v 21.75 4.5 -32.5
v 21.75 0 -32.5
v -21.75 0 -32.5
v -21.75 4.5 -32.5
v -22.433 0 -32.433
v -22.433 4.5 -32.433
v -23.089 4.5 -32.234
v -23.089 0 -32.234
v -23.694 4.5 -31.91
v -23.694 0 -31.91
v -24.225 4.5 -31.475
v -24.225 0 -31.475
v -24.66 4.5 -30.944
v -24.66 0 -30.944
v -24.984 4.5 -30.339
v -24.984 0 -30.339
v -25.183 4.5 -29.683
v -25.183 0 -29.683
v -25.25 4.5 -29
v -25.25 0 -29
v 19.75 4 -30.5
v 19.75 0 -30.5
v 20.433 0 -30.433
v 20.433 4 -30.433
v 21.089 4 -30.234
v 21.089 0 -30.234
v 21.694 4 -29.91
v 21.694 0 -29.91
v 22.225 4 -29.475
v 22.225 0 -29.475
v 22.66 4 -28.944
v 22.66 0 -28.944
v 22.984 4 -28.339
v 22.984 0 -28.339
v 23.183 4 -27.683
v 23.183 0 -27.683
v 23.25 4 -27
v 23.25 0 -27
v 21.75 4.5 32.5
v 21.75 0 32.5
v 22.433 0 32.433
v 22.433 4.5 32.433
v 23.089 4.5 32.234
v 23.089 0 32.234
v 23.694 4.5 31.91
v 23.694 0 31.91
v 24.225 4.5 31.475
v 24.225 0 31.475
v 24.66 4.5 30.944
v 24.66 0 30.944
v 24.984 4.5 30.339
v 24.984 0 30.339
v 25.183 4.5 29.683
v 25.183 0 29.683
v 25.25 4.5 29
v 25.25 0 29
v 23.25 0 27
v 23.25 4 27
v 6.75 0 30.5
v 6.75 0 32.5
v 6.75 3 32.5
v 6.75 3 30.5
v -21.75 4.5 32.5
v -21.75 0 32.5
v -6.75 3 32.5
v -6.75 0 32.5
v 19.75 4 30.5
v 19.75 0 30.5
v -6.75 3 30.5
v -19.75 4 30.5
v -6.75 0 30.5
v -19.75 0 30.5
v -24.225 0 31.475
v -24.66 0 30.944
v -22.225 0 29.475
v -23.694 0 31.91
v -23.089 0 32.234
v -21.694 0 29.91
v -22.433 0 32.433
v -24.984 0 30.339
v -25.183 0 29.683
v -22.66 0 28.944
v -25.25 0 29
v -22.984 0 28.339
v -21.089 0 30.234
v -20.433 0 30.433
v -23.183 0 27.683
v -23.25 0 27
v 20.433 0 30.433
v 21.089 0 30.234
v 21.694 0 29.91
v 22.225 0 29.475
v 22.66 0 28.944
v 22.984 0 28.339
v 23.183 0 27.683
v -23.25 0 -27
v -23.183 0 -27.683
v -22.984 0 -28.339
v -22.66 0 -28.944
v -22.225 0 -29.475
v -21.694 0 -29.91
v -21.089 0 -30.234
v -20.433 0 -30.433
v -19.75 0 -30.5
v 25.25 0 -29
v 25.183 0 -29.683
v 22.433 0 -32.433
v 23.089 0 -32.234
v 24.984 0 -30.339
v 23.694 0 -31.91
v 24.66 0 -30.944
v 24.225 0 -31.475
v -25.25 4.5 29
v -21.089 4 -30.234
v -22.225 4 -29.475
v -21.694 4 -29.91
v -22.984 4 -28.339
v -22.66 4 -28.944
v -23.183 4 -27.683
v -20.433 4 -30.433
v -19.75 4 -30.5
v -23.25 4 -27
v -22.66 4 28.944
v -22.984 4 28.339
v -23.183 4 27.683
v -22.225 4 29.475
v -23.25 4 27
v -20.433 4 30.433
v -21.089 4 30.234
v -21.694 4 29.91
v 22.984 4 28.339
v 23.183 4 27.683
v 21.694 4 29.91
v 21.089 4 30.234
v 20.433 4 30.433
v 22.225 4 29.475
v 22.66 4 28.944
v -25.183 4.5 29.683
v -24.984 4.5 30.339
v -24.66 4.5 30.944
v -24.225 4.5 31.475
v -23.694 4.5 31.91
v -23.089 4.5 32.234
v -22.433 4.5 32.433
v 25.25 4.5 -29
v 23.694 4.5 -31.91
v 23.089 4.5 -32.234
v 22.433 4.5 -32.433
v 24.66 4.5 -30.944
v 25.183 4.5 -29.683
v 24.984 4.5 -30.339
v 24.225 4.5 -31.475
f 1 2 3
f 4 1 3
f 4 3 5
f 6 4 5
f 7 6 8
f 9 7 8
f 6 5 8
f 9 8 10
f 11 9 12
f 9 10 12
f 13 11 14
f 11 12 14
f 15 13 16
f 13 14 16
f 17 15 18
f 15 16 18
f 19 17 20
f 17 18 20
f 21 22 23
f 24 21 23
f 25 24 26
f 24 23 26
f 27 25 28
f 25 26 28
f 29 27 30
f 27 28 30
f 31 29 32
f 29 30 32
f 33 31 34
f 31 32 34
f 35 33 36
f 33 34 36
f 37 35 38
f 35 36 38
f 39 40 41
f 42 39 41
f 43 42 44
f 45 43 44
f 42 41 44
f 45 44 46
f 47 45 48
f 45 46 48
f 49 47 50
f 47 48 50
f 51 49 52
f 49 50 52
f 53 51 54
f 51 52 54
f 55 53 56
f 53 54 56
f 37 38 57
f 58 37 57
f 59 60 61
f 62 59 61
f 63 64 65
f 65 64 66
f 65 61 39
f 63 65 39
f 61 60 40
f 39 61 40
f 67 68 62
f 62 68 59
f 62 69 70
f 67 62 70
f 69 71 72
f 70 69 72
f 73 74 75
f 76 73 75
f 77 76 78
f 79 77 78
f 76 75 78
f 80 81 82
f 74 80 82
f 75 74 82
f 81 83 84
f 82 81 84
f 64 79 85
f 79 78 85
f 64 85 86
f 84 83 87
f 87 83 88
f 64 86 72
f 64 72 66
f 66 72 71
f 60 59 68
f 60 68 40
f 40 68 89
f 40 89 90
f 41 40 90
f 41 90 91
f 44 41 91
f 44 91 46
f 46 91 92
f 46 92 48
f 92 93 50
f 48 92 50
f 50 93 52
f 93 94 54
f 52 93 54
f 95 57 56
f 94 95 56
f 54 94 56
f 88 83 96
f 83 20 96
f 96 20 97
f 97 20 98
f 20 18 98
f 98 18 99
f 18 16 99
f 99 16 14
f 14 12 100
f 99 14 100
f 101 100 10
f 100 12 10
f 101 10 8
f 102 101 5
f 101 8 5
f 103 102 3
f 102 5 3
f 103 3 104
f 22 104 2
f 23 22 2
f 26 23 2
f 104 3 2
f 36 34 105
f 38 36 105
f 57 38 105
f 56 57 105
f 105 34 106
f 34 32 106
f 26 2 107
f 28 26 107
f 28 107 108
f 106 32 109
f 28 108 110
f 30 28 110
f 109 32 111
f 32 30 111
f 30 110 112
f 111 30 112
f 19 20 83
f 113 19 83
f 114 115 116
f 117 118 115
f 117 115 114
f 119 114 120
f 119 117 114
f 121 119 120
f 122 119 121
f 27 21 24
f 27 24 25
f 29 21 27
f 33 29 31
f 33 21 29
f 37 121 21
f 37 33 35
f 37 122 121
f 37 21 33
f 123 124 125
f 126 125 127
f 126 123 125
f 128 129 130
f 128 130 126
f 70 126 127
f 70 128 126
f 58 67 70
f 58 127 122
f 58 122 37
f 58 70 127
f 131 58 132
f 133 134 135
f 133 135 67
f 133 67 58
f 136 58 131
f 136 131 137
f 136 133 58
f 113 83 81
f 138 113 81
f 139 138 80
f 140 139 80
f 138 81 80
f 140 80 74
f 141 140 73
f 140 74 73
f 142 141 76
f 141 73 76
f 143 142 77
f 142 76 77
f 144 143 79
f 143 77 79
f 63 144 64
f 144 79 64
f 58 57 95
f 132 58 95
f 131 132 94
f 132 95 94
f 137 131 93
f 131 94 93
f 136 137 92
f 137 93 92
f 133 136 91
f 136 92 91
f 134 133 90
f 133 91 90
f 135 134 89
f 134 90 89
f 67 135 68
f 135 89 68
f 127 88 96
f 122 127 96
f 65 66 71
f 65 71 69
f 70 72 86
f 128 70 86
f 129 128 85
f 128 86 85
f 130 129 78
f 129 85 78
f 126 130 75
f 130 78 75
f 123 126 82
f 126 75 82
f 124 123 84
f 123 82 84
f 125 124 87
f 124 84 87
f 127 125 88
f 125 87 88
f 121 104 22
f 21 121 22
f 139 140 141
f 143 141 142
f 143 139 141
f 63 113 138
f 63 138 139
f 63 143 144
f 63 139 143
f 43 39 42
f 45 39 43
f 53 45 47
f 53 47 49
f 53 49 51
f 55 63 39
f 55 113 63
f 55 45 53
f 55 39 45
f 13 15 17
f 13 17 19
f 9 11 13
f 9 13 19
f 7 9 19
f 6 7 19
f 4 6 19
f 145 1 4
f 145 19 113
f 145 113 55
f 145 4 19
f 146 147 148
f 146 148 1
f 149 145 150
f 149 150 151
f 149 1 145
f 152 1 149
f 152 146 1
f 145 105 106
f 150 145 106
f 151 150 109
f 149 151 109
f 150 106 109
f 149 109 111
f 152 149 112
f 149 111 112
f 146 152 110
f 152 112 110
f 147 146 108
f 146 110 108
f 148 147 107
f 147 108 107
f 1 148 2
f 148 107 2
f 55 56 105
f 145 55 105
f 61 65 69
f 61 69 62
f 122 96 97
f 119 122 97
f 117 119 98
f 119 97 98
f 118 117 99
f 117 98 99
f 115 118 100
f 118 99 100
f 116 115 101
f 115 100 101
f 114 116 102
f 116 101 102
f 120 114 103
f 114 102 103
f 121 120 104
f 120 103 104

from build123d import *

# Parameters (mm, degrees)
BOSS_EXTRUDE1_DEPTH = 4.5
CUT_EXTRUDE1_DEPTH  = 4
SKETCH3_W           = 13.5
SKETCH3_H           = 6
CUT_EXTRUDE2_DEPTH  = 15


with BuildPart() as part:
    # Sketch1 → Boss-Extrude1 (new body)
    with BuildSketch(Plane(origin=(0, 0, 0), x_dir=(1, 0, 0), z_dir=(0, 1, 0))):
        with BuildLine():
            Line((-21.75, -32.5), (21.75, -32.5))
            ThreePointArc((21.75, -32.5), (24.224873734, -31.474873734), (25.25, -29))
            Line((25.25, -29), (25.25, 29))
            ThreePointArc((25.25, 29), (24.224873734, 31.474873734), (21.75, 32.5))
            Line((21.75, 32.5), (-21.75, 32.5))
            ThreePointArc((-21.75, 32.5), (-24.224873734, 31.474873734), (-25.25, 29))
            Line((-25.25, 29), (-25.25, -29))
            ThreePointArc((-25.25, -29), (-24.224873734, -31.474873734), (-21.75, -32.5))
        make_face()
    extrude(amount=BOSS_EXTRUDE1_DEPTH)

    # Sketch2 → Cut-Extrude1 (cut)
    with BuildSketch(Plane.XZ):
        with BuildLine():
            Line((-19.75, -30.5), (19.75, -30.5))
            ThreePointArc((19.75, -30.5), (22.224873734, -29.474873734), (23.25, -27))
            Line((23.25, -27), (23.25, 27))
            ThreePointArc((23.25, 27), (22.224873734, 29.474873734), (19.75, 30.5))
            Line((19.75, 30.5), (-19.75, 30.5))
            ThreePointArc((-19.75, 30.5), (-22.224873734, 29.474873734), (-23.25, 27))
            Line((-23.25, 27), (-23.25, -27))
            ThreePointArc((-23.25, -27), (-22.224873734, -29.474873734), (-19.75, -30.5))
        make_face()
    extrude(amount=-CUT_EXTRUDE1_DEPTH, mode=Mode.SUBTRACT)

    # Sketch3 → Cut-Extrude2 (cut)
    with BuildSketch(Plane.XY.offset(32.5)):
        Rectangle(SKETCH3_W, SKETCH3_H)
    extrude(amount=-CUT_EXTRUDE2_DEPTH, mode=Mode.SUBTRACT)


solid = part.part
